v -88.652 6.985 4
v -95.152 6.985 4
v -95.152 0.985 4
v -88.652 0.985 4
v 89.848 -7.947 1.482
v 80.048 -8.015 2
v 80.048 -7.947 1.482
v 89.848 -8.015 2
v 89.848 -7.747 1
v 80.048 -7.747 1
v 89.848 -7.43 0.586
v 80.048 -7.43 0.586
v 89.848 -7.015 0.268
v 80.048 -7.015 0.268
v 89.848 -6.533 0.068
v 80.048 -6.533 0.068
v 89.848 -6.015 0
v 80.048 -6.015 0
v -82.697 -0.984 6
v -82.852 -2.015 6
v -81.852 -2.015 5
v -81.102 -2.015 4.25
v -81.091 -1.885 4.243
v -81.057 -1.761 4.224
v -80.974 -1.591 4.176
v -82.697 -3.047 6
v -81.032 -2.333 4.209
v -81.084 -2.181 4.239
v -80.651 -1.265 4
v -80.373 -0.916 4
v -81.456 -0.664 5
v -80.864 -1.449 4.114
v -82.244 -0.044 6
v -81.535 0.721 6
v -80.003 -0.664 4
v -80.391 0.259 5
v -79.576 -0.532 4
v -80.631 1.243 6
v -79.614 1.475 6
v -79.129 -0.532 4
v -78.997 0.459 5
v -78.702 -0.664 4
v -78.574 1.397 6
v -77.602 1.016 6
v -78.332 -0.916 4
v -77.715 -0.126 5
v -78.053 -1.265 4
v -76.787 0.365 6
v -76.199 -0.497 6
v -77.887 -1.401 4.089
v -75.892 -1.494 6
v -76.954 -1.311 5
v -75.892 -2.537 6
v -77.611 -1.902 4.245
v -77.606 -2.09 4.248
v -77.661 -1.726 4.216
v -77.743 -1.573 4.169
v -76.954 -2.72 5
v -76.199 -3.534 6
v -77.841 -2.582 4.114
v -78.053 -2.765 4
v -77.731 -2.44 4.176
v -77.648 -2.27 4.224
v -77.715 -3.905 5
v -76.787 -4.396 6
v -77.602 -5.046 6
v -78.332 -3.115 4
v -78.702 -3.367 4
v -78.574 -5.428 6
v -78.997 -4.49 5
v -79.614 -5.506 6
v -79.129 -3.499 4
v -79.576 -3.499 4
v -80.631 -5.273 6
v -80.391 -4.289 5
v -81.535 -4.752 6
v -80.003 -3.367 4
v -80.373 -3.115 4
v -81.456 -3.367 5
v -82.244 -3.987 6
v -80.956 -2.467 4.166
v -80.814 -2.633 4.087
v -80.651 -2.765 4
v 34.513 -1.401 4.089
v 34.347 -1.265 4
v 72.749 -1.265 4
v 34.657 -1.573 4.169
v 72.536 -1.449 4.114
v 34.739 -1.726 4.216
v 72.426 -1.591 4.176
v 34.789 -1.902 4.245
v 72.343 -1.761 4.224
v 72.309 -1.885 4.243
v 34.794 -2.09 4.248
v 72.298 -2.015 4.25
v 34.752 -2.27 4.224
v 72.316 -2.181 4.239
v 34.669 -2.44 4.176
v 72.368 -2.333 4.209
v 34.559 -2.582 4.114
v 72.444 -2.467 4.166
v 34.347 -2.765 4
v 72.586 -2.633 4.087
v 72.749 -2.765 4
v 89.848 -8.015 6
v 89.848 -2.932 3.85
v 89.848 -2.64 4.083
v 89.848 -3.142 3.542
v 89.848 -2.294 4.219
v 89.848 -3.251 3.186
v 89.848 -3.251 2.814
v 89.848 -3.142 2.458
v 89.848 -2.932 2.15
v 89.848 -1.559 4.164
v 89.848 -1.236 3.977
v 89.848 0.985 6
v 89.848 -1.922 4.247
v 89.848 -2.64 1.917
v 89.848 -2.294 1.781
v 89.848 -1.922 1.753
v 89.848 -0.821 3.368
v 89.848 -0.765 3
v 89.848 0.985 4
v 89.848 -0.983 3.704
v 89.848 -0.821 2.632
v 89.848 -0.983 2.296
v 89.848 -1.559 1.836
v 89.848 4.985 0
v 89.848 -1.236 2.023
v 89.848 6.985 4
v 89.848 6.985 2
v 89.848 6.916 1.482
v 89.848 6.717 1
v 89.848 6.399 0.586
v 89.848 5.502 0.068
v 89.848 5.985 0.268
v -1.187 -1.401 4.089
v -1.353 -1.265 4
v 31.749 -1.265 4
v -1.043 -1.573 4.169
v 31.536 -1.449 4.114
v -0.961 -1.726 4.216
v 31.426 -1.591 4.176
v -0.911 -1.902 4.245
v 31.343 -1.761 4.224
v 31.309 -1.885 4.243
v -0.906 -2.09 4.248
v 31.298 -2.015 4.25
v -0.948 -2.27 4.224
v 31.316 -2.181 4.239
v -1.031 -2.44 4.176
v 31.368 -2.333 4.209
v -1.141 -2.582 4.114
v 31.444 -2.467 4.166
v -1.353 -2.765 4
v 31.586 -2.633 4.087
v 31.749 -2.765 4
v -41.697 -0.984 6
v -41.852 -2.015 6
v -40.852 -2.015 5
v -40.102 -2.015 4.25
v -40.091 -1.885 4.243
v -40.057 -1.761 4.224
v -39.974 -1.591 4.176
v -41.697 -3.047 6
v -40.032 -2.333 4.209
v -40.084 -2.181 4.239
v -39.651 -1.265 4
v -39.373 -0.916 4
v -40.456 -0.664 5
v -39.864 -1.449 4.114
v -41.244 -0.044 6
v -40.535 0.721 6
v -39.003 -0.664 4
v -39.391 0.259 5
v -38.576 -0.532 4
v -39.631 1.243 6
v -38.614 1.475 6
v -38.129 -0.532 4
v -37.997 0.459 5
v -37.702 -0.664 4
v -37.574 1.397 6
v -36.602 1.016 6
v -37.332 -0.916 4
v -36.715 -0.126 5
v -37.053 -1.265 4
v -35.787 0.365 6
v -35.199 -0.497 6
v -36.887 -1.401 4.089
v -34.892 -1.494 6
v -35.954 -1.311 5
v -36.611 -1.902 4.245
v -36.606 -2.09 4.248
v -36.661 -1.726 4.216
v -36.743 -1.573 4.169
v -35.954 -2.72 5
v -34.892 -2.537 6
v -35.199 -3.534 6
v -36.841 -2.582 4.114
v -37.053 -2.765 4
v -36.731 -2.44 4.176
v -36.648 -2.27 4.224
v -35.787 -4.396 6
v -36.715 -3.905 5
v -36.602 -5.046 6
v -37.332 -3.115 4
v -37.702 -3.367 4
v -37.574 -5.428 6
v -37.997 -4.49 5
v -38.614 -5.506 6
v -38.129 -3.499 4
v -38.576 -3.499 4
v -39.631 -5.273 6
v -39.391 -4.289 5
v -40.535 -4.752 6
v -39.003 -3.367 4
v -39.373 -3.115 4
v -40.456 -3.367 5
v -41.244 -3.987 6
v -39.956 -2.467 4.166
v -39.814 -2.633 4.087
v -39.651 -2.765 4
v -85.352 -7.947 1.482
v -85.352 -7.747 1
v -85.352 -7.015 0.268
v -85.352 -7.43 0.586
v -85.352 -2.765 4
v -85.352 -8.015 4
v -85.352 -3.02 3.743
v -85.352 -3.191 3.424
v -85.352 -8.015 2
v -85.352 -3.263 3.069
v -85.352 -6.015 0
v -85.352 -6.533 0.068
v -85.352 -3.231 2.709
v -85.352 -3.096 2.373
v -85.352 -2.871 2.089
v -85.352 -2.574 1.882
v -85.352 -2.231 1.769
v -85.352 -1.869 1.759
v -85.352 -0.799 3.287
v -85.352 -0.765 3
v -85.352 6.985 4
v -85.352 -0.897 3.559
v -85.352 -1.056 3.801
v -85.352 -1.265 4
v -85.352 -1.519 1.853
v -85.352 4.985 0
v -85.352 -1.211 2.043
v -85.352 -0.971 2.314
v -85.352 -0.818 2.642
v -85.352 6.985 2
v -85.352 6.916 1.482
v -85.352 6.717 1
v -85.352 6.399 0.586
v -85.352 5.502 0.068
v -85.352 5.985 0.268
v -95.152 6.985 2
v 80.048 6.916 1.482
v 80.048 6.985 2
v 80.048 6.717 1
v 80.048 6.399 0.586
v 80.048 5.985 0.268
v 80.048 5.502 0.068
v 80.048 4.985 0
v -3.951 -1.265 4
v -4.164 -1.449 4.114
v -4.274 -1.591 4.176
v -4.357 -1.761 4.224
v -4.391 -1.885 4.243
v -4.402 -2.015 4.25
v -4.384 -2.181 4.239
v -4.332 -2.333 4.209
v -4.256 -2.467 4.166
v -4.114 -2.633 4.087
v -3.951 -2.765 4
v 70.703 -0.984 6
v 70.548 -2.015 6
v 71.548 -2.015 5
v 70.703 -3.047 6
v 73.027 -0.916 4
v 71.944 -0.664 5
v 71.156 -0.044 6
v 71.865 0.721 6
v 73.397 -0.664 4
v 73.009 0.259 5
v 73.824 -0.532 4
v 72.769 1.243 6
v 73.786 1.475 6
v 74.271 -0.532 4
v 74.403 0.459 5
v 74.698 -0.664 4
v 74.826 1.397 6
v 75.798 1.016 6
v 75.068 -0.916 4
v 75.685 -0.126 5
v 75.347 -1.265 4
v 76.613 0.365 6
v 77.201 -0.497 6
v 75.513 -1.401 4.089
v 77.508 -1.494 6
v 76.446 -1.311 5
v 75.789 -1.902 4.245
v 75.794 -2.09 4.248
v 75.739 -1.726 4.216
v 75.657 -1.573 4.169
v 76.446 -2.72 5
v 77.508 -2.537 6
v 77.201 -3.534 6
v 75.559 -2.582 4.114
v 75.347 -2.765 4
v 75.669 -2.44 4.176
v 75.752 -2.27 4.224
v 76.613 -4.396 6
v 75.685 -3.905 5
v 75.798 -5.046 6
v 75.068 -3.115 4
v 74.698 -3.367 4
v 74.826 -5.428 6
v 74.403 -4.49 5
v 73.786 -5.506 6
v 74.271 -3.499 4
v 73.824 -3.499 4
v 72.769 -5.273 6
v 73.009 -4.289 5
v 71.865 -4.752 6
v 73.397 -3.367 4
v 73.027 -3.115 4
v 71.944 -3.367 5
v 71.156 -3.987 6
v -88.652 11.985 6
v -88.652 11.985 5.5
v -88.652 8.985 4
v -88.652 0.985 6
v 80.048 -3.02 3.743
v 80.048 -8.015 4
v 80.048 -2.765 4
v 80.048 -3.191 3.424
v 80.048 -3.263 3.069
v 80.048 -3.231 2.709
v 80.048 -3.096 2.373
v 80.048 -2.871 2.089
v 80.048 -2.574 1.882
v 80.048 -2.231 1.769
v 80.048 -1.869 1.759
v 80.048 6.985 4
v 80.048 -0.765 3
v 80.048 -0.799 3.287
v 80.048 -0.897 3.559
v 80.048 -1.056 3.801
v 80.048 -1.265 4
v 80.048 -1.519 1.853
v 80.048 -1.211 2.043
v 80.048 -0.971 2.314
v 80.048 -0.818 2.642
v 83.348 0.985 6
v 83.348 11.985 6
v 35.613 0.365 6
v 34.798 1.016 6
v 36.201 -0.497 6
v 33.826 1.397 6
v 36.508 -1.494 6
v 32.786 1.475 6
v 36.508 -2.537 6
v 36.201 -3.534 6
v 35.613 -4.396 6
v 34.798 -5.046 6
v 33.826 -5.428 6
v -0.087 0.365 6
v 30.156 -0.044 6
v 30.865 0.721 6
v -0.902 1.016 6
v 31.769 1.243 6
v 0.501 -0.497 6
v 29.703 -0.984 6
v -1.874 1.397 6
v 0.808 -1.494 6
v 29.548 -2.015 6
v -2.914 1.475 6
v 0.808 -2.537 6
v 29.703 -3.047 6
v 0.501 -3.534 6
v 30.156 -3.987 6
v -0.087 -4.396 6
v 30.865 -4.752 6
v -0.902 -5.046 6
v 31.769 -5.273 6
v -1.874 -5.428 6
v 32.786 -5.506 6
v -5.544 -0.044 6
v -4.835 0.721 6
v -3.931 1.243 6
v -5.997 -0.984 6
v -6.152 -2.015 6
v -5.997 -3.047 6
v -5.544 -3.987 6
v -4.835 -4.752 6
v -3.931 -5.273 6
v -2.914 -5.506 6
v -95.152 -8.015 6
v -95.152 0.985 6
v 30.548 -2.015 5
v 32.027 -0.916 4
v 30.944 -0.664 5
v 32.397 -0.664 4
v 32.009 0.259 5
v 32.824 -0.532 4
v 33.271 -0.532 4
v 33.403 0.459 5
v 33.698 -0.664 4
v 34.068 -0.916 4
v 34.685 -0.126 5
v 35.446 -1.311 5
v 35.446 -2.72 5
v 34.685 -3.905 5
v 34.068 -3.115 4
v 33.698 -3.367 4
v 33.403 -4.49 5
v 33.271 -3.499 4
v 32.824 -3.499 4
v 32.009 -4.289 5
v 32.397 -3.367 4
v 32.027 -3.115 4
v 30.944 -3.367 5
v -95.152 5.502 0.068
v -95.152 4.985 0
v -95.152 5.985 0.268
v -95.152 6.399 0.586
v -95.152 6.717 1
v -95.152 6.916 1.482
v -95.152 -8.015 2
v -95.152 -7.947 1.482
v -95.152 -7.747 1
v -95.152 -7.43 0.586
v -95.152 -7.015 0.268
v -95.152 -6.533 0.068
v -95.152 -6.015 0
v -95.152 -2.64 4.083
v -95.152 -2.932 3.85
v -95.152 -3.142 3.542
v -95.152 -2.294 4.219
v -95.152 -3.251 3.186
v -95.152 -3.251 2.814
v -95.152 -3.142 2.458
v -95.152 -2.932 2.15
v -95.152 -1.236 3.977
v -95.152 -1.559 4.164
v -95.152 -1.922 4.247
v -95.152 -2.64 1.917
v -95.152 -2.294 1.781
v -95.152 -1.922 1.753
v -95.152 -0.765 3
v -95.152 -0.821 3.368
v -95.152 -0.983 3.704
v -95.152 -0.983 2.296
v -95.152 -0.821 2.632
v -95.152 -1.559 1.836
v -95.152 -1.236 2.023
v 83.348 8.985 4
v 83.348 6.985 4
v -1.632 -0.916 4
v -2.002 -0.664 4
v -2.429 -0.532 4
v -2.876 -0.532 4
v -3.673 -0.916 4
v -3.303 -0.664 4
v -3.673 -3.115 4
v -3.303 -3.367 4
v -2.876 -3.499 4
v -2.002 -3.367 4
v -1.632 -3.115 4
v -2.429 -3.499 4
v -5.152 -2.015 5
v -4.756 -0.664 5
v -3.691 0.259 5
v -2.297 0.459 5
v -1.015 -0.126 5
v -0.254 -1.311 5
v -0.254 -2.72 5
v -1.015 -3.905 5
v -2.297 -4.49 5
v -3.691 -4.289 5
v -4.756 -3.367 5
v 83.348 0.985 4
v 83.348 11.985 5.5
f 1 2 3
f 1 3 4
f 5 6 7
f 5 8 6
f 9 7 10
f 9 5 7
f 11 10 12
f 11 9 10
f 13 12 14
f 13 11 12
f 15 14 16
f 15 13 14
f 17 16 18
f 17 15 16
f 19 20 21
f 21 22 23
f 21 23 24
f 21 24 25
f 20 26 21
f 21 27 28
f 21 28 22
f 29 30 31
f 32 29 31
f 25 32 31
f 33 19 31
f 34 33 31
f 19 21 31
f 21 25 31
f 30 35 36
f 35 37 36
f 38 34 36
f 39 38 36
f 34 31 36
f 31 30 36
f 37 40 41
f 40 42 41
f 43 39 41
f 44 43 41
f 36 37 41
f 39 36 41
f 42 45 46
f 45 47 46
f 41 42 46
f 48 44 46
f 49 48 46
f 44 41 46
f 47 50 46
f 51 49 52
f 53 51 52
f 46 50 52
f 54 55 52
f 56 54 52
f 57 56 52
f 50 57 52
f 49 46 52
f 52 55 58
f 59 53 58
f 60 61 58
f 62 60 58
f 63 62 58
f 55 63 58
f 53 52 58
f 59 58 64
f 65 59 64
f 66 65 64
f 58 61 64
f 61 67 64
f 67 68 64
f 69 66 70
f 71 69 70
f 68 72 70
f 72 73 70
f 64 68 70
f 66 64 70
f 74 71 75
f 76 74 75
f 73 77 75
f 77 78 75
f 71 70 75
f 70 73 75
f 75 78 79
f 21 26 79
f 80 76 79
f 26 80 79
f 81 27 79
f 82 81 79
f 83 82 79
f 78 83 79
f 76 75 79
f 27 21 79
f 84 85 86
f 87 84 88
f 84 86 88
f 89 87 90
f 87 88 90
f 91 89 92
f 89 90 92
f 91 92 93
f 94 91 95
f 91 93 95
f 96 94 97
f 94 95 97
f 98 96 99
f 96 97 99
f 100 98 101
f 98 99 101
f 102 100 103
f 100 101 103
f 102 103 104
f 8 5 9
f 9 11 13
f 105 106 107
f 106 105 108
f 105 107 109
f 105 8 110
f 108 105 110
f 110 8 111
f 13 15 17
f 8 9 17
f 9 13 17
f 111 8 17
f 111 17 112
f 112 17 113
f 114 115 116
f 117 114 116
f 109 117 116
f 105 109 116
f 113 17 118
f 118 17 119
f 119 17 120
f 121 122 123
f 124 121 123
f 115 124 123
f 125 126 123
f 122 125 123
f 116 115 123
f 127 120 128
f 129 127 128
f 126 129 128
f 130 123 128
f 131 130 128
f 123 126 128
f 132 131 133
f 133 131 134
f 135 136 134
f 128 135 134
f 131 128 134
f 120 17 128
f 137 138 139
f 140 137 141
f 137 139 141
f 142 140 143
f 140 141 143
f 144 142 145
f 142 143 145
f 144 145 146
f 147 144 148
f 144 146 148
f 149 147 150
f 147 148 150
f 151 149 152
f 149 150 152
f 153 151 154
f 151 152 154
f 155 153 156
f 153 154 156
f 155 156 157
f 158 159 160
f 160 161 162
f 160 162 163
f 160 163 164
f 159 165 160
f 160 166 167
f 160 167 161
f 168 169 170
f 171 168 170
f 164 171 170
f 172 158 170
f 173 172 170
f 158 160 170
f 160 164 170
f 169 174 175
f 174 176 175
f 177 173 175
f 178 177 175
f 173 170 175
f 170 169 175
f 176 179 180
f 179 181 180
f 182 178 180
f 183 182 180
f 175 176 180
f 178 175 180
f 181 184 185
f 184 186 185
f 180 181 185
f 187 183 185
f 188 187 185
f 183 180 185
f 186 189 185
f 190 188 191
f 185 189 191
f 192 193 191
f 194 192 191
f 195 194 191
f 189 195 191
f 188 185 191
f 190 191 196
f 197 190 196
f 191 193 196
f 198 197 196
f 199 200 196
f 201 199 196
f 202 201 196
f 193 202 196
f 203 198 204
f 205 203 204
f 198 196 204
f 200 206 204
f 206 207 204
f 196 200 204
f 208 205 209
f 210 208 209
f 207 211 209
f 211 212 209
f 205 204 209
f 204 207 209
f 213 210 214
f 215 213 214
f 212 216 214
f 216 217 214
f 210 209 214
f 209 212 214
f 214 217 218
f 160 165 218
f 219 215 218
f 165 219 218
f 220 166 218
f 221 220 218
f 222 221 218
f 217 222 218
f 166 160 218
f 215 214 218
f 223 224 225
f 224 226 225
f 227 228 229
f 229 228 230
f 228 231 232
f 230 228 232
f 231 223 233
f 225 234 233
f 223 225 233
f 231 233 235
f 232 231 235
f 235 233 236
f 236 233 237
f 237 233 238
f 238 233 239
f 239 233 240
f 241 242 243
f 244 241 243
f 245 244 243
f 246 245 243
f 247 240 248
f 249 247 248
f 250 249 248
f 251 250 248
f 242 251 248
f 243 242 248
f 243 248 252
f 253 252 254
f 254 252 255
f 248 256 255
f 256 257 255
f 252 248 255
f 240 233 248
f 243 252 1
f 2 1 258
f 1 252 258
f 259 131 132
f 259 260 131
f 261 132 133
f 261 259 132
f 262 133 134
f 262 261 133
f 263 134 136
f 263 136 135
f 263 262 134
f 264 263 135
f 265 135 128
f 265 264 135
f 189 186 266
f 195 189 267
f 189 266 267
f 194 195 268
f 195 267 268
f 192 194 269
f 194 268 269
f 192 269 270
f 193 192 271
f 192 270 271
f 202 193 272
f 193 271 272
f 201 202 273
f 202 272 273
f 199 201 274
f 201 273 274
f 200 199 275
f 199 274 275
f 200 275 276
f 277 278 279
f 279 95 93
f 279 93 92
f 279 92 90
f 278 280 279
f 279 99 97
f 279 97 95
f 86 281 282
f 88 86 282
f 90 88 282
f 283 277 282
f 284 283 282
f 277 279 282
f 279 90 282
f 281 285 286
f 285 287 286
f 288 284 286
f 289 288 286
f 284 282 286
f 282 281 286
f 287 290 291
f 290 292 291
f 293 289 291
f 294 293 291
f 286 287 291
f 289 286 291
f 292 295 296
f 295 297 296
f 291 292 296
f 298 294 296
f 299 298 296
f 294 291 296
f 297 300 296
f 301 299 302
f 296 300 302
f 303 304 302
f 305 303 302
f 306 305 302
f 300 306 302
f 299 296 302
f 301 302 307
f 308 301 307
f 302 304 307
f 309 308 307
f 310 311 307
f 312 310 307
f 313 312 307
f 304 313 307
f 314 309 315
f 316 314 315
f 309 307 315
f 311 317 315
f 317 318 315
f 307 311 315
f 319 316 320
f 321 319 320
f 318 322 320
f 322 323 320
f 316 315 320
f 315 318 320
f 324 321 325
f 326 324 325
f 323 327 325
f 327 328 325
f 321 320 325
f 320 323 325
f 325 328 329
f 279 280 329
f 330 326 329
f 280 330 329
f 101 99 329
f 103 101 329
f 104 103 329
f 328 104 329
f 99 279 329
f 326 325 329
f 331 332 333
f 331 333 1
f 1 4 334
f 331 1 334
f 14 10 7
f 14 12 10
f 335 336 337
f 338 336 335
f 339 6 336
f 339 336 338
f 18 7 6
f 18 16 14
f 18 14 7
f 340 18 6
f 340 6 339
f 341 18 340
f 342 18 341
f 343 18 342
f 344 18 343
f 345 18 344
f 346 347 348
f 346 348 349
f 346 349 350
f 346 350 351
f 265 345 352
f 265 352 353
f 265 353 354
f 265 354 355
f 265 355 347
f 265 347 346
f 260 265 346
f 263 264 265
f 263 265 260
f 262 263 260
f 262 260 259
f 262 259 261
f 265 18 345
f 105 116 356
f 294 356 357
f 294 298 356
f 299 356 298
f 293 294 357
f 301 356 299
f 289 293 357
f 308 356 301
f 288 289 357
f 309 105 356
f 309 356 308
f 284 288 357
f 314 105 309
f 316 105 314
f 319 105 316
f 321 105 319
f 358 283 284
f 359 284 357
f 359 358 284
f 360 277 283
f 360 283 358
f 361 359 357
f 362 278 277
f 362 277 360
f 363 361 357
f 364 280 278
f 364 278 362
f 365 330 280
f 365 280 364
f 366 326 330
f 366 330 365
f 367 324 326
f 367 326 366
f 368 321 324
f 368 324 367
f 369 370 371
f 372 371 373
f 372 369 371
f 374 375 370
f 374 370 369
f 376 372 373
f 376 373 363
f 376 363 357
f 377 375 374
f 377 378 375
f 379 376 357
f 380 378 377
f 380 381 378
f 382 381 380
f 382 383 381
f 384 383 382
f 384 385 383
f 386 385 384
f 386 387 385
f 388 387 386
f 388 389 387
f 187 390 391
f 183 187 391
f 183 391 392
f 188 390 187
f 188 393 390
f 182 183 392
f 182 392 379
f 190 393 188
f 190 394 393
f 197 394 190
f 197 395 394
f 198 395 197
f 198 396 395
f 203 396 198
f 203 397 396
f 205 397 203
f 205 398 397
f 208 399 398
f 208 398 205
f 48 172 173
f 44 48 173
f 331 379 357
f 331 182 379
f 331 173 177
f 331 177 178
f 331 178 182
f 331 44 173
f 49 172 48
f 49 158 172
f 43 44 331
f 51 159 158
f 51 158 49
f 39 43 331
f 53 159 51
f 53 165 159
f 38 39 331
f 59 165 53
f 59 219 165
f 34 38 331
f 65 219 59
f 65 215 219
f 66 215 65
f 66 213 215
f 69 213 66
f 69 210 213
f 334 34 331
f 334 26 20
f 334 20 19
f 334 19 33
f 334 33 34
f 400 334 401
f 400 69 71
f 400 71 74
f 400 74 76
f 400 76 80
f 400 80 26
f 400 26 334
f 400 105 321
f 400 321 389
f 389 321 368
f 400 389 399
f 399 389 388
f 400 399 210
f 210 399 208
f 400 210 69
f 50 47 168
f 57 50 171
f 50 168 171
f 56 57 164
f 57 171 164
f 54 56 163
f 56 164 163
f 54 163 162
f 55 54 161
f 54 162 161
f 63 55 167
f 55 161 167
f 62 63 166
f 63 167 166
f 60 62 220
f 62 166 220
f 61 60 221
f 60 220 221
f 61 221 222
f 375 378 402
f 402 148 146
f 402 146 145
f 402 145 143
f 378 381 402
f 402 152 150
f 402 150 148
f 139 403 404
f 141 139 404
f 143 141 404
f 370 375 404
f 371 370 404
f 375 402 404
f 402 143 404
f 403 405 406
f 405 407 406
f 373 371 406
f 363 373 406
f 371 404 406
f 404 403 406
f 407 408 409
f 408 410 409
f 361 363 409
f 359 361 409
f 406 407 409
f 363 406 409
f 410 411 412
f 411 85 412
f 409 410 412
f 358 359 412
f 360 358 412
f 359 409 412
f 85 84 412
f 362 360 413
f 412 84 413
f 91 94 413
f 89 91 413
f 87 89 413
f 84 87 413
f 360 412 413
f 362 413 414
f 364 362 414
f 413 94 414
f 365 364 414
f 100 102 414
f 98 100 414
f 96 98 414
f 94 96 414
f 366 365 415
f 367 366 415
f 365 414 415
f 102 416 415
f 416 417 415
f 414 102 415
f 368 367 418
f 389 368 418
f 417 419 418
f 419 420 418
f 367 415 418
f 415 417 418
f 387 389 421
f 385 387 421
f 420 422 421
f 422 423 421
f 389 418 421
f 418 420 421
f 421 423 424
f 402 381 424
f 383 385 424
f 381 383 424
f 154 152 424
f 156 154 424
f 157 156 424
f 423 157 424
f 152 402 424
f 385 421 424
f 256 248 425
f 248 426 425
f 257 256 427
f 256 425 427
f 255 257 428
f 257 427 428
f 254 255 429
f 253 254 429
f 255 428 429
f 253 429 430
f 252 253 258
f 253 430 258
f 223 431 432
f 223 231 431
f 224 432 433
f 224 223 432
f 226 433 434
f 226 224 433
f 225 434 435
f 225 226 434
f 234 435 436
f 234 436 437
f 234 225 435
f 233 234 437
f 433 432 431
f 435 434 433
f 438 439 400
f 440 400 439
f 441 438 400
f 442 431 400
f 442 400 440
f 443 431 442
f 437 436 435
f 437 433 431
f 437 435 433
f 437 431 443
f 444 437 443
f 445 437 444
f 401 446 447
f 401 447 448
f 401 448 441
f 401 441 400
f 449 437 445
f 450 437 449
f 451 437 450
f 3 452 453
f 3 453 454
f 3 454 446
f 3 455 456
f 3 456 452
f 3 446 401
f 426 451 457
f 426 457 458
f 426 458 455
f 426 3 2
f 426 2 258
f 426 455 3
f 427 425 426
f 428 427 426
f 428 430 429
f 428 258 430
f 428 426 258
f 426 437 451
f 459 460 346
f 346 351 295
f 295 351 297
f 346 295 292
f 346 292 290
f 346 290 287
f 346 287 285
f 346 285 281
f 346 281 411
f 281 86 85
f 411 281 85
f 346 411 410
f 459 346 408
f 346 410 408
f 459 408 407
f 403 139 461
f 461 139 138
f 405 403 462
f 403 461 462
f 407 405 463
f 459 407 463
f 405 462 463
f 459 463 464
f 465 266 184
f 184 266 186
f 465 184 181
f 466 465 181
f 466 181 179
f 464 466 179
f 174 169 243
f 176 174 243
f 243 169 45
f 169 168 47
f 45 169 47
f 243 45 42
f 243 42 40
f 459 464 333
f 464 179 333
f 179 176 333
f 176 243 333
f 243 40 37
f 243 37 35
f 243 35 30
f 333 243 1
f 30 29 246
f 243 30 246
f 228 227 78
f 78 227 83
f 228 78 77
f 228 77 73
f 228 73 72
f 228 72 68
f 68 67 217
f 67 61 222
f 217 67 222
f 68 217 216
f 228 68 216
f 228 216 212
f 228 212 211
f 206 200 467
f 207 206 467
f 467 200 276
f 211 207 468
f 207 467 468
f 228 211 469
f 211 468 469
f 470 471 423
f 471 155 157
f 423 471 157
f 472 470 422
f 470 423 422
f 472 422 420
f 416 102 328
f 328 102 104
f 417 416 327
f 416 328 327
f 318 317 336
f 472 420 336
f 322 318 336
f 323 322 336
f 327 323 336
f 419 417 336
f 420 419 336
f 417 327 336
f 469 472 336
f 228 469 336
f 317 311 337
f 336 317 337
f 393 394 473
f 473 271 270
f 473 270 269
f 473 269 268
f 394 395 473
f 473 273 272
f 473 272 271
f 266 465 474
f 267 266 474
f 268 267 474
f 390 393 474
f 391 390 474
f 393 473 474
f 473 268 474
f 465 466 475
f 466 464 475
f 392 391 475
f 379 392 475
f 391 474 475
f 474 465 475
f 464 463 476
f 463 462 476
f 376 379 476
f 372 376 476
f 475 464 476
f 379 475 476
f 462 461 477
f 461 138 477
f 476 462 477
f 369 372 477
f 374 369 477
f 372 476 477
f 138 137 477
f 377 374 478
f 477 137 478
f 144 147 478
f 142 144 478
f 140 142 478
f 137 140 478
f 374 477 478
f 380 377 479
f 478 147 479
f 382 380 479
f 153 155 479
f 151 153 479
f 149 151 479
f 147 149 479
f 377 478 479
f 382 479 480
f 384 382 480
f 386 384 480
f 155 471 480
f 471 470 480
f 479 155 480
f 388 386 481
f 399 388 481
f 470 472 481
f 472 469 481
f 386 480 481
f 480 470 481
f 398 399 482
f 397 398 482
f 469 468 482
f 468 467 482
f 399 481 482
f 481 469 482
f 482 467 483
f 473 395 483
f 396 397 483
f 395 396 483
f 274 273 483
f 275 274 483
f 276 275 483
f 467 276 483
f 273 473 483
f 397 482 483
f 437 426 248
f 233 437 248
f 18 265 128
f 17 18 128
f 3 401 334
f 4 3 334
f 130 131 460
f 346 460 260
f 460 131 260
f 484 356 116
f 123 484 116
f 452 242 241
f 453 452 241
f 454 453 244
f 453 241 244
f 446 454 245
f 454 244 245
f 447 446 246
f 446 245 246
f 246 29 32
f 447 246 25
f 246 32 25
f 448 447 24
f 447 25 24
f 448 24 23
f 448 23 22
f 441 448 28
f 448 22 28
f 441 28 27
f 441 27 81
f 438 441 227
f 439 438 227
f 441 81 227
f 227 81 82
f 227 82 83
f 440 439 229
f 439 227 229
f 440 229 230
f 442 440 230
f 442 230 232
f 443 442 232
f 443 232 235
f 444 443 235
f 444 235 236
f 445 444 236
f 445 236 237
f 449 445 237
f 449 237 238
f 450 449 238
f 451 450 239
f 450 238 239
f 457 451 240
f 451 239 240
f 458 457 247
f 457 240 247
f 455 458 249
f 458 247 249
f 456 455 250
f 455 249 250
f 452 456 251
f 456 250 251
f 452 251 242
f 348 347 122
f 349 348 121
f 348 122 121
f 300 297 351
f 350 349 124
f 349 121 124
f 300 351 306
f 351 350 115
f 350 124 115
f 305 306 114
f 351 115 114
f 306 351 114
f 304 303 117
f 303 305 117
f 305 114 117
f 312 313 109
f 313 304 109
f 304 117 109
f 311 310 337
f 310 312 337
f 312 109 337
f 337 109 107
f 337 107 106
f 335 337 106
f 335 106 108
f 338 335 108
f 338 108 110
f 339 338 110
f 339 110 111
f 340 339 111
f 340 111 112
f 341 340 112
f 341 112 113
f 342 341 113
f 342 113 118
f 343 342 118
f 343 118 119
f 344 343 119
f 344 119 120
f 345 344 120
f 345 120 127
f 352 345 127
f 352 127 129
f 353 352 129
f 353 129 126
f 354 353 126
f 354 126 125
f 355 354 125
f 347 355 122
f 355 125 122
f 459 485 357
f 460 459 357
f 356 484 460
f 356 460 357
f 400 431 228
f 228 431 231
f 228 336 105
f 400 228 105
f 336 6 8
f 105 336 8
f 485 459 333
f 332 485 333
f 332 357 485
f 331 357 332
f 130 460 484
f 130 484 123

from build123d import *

# Parameters (mm, degrees)
F0_W            = 165.4
F0_H            = 15
F0_W_2          = 9.8
F1_DEPTH        = 6
F2_DEPTH        = 4
F4_D            = 2.5
F4_DEPTH        = 200
F5_R            = 2
F7_W            = 6.5
F7_H            = 6
F8_DEPTH        = 2
F9_W            = 172
F9_H            = 2
F10_DEPTH       = 5
F11_SIZE2       = 3
F11_SIZE        = 1.5
F13_D           = 3
F13_DEPTH       = 4
F13_CSINK_D     = 7
F13_CSINK_ANGLE = 90


with BuildPart() as f1:
    # F0 (on Top) → F1 (new body)
    with BuildSketch(Plane.XY):
        with Locations((-2.652436, -0.515384)):
            Rectangle(F0_W, F0_H)
        with Locations((-90.252436, -0.515384)):
            Rectangle(F0_W_2, F0_H)
        with Locations((84.947564, -0.515384)):
            Rectangle(F0_W_2, F0_H)
    extrude(amount=F1_DEPTH)

    # F0 (on Top) → F2 (cut)
    with BuildSketch(Plane.XY):
        with Locations((-2.652436, -0.515384)):
            Rectangle(F0_W, F0_H)
    extrude(amount=F2_DEPTH, mode=Mode.SUBTRACT)

    # F4
    with Locations(Plane(origin=(-95.152436, 0, 0), x_dir=(0, -1, 0), z_dir=(-1, 0, 0))):
        with Locations((2.015384, 3)):
            Hole(F4_D / 2, depth=F4_DEPTH)

    # F5
    f5_edges = [f1.edges().sort_by_distance(p)[0] for p in [
        (84.947564, 6.984616, 0),
        (-90.252436, 6.984616, 0),
        (-90.252436, -8.015384, 0),
        (84.947564, -8.015384, 0),
    ]]
    fillet(f5_edges, radius=F5_R)

    # F7 (on face) → F8 (cut)
    with BuildSketch(Plane.XY.offset(6)):
        with Locations((-91.902436, 3.984616)):
            Rectangle(F7_W, F7_H)
        with Locations((86.597564, 3.984616)):
            Rectangle(F7_W, F7_H)
    extrude(amount=-F8_DEPTH, mode=Mode.SUBTRACT)

    # F9 (on face) → F10 (join)
    with BuildSketch(Plane(origin=(0, 6.984616, 0), x_dir=(-1, 0, 0), z_dir=(0, 1, 0))):
        with Locations((2.652436, 5)):
            Rectangle(F9_W, F9_H)
    extrude(amount=F10_DEPTH)

    # F11
    f11_edges = [f1.edges().sort_by_distance(p)[0] for p in [
        (-2.652436, 11.984616, 4),
    ]]
    chamfer(f11_edges, length=F11_SIZE, length2=F11_SIZE2)

    # F13
    with Locations(Plane.XY.offset(6)):
        with Locations((-79.352436, -2.015384), (-38.352436, -2.015384), (-2.652436, -2.015384), (33.047564, -2.015384), (74.047564, -2.015384)):
            CounterSinkHole(F13_D / 2, F13_CSINK_D / 2, depth=F13_DEPTH, counter_sink_angle=F13_CSINK_ANGLE)


solid = f1.part
